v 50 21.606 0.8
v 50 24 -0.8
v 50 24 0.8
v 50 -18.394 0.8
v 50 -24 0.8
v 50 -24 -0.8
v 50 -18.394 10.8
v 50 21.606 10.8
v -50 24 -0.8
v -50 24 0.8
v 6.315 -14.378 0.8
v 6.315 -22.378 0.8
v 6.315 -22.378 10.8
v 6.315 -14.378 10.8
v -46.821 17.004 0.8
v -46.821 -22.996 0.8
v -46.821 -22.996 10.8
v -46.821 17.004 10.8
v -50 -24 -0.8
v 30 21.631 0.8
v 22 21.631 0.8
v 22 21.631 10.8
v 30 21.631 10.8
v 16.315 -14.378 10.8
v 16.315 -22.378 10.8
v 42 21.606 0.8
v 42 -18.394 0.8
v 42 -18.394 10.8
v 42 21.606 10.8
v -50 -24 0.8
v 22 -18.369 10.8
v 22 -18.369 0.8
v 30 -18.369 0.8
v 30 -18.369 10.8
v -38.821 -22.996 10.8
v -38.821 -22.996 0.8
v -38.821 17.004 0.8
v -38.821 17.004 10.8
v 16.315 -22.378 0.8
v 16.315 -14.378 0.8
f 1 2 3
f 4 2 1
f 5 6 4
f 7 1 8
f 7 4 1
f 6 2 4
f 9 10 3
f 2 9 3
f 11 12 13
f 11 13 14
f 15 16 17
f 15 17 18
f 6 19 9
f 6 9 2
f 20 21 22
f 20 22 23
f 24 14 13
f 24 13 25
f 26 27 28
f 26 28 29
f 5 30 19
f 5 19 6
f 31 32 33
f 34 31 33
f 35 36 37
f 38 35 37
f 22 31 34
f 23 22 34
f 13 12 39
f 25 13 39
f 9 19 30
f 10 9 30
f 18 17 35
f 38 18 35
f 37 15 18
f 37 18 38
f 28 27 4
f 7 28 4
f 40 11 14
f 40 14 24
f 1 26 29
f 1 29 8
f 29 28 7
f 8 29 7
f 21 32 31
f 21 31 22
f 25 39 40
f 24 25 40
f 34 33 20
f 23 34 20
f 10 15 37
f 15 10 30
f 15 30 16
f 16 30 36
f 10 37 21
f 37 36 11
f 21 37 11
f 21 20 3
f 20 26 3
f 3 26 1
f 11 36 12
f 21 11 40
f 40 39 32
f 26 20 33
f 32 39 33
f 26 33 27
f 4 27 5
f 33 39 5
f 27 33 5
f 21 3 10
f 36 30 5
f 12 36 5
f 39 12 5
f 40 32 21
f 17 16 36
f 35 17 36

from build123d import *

# Parameters (mm, degrees)
F0_W     = 100
F0_H     = 1.6
F1_DEPTH = 24
F2_W     = 8
F2_H     = 40
F3_DEPTH = 10
F4_W     = 8
F4_H     = 40
F5_DEPTH = 10
F6_W     = 8
F6_H     = 40
F7_DEPTH = 10
F8_W     = 10
F8_H     = 8
F9_DEPTH = 10


with BuildPart() as f1:
    # F0 (on Front) → F1 (new body, symmetric)
    with BuildSketch(Plane.XZ):
        Rectangle(F0_W, F0_H)
    extrude(amount=F1_DEPTH, both=True)

    # F2 (on face) → F3 (join)
    with BuildSketch(Plane.XY.offset(0.8)):
        with Locations((-42.821201, -2.99572)):
            Rectangle(F2_W, F2_H)
    extrude(amount=F3_DEPTH)

    # F4 (on face) → F5 (join)
    with BuildSketch(Plane.XY.offset(0.8)):
        with Locations((46, 1.605854)):
            Rectangle(F4_W, F4_H)
    extrude(amount=F5_DEPTH)

    # F6 (on face) → F7 (join)
    with BuildSketch(Plane.XY.offset(0.8)):
        with Locations((26, 1.631008)):
            Rectangle(F6_W, F6_H)
    extrude(amount=F7_DEPTH)

    # F8 (on face) → F9 (join)
    with BuildSketch(Plane.XY.offset(0.8)):
        with Locations((11.315175, -18.378249)):
            Rectangle(F8_W, F8_H)
    extrude(amount=F9_DEPTH)


solid = f1.part
